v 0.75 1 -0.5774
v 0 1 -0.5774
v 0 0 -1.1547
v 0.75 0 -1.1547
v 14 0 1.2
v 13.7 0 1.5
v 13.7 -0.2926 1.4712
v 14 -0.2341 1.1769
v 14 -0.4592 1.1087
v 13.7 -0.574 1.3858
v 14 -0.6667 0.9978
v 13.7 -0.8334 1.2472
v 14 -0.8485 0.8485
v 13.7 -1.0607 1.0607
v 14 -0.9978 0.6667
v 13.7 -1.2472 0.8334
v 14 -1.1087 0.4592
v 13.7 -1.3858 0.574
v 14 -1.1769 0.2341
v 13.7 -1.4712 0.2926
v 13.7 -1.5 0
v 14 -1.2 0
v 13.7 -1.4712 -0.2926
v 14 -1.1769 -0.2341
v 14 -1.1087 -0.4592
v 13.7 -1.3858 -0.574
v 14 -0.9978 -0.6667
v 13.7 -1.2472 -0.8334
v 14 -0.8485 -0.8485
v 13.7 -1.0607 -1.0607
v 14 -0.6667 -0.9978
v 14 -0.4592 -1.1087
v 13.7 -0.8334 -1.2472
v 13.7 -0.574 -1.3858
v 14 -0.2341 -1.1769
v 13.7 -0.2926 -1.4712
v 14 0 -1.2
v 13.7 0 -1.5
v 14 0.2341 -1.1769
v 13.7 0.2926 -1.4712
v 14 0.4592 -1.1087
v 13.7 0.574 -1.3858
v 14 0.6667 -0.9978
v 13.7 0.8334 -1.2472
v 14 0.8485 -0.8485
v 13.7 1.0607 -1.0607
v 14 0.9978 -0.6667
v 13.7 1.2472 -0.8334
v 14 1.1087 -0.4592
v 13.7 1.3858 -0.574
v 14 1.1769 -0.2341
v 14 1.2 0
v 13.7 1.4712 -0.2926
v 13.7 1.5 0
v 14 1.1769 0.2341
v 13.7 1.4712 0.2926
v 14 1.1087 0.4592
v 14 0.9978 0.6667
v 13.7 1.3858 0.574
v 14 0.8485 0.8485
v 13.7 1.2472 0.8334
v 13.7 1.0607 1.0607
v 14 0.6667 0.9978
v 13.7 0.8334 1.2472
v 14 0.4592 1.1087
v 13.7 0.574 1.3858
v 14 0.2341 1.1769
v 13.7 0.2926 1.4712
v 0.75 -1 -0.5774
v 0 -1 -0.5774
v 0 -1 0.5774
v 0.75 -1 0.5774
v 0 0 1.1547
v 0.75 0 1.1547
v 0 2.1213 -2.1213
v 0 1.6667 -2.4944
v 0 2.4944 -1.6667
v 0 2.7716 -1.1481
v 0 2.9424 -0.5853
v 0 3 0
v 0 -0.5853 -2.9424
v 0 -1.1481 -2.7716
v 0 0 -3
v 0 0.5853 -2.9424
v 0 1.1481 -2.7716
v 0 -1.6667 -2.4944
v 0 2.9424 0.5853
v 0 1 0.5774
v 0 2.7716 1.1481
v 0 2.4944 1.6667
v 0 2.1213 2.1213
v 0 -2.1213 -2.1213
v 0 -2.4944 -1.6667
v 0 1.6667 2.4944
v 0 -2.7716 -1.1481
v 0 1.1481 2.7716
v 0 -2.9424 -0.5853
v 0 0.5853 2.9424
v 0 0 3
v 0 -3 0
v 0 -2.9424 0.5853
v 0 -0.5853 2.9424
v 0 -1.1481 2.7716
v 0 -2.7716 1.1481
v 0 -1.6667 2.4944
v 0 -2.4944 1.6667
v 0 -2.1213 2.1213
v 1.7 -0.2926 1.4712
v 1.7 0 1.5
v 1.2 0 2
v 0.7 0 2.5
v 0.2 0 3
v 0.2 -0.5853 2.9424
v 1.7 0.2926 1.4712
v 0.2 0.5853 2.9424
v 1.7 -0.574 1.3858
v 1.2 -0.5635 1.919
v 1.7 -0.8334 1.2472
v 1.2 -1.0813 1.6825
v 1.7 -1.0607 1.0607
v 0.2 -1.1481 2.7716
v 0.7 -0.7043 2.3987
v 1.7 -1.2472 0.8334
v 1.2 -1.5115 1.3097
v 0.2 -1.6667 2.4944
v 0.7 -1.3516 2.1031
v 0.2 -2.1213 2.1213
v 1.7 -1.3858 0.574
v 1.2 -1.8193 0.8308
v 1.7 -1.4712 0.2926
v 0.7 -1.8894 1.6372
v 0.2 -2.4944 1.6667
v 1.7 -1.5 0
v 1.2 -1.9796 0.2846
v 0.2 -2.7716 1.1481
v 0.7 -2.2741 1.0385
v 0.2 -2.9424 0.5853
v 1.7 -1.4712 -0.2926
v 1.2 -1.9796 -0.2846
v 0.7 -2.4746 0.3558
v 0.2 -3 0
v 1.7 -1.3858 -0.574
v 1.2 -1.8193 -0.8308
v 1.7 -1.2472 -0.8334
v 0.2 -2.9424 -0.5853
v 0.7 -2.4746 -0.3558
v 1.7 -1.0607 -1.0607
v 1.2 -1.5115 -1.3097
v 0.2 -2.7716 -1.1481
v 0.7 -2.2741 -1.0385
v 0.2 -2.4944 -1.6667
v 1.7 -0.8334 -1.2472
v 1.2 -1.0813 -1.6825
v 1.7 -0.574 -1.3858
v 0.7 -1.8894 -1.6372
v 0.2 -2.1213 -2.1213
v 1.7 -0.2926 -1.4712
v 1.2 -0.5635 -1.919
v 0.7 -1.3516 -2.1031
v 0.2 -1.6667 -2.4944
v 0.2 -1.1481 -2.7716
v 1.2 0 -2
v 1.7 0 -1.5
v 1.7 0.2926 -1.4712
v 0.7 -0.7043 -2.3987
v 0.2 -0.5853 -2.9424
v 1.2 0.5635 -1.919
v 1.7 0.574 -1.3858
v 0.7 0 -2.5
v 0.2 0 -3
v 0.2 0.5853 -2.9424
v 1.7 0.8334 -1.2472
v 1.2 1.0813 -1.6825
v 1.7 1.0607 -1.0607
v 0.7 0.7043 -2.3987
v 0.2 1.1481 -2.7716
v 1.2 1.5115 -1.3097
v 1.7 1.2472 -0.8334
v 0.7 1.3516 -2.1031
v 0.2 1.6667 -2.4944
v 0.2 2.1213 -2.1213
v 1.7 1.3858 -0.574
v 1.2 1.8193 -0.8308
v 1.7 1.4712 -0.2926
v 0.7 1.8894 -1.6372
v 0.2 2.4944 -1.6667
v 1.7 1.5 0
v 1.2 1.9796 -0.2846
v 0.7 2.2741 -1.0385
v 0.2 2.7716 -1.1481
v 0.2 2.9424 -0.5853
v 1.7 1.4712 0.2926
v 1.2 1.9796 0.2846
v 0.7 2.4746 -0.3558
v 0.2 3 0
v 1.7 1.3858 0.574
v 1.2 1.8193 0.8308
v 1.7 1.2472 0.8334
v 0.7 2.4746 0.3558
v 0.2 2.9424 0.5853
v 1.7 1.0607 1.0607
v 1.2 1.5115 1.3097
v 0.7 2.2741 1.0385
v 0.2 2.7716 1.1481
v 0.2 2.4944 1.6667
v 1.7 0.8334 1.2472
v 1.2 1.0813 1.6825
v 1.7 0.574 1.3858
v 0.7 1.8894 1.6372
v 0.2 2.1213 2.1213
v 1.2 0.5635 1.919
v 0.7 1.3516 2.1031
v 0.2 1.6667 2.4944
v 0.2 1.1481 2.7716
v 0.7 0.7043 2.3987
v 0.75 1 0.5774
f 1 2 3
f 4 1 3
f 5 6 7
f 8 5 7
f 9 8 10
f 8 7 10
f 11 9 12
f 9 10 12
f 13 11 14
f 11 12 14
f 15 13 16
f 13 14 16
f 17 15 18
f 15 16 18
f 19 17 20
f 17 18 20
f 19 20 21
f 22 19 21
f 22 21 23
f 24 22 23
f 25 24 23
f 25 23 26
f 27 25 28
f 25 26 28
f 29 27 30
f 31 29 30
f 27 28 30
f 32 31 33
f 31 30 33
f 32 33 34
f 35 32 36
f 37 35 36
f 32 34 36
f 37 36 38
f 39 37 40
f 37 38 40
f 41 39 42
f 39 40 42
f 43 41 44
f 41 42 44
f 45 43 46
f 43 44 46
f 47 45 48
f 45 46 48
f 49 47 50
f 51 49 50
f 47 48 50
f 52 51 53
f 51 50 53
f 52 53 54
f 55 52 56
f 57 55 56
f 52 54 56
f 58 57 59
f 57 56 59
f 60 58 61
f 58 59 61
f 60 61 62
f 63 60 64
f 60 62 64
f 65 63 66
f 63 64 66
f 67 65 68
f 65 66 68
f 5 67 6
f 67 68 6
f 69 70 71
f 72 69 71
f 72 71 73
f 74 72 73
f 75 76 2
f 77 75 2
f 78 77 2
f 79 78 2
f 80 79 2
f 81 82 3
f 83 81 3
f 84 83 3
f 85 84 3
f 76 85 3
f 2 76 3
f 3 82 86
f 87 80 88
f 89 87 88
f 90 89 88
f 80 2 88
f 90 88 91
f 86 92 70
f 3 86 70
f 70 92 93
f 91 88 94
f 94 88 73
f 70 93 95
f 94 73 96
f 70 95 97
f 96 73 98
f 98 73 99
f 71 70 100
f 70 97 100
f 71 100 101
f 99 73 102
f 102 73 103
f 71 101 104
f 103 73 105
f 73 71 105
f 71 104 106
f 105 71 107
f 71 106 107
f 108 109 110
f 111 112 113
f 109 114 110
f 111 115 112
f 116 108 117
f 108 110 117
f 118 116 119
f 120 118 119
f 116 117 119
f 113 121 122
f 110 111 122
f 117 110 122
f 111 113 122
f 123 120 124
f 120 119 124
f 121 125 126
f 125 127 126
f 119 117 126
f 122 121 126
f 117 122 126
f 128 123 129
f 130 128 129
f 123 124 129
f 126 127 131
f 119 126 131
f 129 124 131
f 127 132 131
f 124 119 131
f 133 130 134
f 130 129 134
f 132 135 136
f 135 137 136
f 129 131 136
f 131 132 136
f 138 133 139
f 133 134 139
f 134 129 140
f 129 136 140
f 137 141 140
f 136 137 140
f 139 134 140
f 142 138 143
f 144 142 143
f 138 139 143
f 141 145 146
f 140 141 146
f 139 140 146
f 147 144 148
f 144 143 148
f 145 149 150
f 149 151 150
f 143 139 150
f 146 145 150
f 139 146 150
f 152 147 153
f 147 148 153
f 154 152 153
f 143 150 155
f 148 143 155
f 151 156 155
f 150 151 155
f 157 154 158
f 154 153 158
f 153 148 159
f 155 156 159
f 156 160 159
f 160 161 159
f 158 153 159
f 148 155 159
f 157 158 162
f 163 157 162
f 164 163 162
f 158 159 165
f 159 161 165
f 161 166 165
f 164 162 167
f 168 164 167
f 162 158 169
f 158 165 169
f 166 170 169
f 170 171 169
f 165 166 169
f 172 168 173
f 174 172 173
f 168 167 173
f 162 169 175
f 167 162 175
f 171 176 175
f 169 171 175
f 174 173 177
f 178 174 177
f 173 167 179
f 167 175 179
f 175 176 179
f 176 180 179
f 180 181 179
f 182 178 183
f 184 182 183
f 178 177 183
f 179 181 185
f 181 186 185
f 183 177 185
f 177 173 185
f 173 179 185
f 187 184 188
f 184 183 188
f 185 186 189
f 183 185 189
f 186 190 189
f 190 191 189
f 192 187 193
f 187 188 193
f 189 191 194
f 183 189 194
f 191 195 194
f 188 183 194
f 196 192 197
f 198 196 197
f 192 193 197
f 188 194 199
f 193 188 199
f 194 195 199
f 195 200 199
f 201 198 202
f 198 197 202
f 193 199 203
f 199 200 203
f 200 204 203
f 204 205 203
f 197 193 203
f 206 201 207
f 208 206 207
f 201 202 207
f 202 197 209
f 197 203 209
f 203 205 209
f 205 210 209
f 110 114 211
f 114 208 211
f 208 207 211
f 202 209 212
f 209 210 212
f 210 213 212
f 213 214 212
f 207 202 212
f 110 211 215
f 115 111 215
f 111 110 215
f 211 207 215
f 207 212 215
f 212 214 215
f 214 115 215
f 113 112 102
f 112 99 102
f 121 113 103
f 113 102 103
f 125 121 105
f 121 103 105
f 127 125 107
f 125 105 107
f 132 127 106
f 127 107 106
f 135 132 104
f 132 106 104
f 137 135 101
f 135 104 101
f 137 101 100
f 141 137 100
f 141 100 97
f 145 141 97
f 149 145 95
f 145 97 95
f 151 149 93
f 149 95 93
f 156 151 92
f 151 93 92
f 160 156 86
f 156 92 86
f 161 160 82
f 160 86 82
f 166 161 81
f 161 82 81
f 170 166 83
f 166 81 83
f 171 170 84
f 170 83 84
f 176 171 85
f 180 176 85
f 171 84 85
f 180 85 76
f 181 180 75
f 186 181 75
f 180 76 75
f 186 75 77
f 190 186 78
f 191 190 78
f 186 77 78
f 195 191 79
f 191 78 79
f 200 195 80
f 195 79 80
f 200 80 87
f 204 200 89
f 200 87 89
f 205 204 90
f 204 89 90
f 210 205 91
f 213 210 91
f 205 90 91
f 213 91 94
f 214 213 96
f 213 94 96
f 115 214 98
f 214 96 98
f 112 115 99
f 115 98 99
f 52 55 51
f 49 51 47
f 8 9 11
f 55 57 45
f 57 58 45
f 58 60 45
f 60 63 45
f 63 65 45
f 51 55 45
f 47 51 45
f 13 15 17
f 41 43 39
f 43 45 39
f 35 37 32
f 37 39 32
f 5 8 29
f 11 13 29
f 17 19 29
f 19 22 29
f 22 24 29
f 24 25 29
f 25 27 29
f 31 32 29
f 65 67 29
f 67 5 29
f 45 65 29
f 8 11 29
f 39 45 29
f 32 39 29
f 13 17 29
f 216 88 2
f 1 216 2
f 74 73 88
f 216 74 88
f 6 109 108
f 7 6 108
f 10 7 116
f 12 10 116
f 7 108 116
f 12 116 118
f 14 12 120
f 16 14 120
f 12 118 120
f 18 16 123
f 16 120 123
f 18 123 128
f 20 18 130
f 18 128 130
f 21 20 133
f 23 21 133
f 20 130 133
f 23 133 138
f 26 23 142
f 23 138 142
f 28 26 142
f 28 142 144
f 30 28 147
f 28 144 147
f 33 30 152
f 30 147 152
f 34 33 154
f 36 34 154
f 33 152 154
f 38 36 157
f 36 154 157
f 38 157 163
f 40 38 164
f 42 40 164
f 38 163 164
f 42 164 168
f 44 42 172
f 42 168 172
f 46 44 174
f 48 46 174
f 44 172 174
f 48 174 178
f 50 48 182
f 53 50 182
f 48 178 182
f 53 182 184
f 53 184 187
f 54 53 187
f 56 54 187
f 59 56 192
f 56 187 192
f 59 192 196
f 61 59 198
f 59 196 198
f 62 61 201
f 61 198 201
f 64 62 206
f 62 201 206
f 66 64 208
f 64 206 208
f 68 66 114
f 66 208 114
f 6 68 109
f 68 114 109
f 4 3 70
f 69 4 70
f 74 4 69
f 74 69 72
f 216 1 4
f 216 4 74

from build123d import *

# Parameters (mm, degrees)
CHANFREIN1_SIZE         = 0.3
ENL_V_MAT_EXTRU_1_DEPTH = 0.75


with BuildPart() as part:
    # Esquisse1 → Révolution1 (revolve)
    with BuildSketch(Plane.XY, mode=Mode.PRIVATE) as r_volution1_sk:
        Polygon((0, 0), (14, 0), (14, 1.5), (1.7, 1.5), (0.2, 3), (0, 3), align=None)
    revolve(r_volution1_sk.sketch.rotate(Axis((0, 0, 0), (1, 0, 0)), 90), axis=Axis((0, 0, 0), (1, 0, 0)))

    # Chanfrein1
    chanfrein1_edges = [part.edges().sort_by_distance(p)[0] for p in [
        (14, 0, -1.5),
    ]]
    chamfer(chanfrein1_edges, length=CHANFREIN1_SIZE)

    # Esquisse2 → Enlèv. mat.-Extru.1 (cut)
    with BuildSketch(Plane.ZY):
        Polygon((0.577350269, -1), (1.154700538, 0), (0.577350269, 1), (-0.577350269, 1), (-1.154700538, 0), (-0.577350269, -1), align=None)
    extrude(amount=-ENL_V_MAT_EXTRU_1_DEPTH, mode=Mode.SUBTRACT)


solid = part.part
